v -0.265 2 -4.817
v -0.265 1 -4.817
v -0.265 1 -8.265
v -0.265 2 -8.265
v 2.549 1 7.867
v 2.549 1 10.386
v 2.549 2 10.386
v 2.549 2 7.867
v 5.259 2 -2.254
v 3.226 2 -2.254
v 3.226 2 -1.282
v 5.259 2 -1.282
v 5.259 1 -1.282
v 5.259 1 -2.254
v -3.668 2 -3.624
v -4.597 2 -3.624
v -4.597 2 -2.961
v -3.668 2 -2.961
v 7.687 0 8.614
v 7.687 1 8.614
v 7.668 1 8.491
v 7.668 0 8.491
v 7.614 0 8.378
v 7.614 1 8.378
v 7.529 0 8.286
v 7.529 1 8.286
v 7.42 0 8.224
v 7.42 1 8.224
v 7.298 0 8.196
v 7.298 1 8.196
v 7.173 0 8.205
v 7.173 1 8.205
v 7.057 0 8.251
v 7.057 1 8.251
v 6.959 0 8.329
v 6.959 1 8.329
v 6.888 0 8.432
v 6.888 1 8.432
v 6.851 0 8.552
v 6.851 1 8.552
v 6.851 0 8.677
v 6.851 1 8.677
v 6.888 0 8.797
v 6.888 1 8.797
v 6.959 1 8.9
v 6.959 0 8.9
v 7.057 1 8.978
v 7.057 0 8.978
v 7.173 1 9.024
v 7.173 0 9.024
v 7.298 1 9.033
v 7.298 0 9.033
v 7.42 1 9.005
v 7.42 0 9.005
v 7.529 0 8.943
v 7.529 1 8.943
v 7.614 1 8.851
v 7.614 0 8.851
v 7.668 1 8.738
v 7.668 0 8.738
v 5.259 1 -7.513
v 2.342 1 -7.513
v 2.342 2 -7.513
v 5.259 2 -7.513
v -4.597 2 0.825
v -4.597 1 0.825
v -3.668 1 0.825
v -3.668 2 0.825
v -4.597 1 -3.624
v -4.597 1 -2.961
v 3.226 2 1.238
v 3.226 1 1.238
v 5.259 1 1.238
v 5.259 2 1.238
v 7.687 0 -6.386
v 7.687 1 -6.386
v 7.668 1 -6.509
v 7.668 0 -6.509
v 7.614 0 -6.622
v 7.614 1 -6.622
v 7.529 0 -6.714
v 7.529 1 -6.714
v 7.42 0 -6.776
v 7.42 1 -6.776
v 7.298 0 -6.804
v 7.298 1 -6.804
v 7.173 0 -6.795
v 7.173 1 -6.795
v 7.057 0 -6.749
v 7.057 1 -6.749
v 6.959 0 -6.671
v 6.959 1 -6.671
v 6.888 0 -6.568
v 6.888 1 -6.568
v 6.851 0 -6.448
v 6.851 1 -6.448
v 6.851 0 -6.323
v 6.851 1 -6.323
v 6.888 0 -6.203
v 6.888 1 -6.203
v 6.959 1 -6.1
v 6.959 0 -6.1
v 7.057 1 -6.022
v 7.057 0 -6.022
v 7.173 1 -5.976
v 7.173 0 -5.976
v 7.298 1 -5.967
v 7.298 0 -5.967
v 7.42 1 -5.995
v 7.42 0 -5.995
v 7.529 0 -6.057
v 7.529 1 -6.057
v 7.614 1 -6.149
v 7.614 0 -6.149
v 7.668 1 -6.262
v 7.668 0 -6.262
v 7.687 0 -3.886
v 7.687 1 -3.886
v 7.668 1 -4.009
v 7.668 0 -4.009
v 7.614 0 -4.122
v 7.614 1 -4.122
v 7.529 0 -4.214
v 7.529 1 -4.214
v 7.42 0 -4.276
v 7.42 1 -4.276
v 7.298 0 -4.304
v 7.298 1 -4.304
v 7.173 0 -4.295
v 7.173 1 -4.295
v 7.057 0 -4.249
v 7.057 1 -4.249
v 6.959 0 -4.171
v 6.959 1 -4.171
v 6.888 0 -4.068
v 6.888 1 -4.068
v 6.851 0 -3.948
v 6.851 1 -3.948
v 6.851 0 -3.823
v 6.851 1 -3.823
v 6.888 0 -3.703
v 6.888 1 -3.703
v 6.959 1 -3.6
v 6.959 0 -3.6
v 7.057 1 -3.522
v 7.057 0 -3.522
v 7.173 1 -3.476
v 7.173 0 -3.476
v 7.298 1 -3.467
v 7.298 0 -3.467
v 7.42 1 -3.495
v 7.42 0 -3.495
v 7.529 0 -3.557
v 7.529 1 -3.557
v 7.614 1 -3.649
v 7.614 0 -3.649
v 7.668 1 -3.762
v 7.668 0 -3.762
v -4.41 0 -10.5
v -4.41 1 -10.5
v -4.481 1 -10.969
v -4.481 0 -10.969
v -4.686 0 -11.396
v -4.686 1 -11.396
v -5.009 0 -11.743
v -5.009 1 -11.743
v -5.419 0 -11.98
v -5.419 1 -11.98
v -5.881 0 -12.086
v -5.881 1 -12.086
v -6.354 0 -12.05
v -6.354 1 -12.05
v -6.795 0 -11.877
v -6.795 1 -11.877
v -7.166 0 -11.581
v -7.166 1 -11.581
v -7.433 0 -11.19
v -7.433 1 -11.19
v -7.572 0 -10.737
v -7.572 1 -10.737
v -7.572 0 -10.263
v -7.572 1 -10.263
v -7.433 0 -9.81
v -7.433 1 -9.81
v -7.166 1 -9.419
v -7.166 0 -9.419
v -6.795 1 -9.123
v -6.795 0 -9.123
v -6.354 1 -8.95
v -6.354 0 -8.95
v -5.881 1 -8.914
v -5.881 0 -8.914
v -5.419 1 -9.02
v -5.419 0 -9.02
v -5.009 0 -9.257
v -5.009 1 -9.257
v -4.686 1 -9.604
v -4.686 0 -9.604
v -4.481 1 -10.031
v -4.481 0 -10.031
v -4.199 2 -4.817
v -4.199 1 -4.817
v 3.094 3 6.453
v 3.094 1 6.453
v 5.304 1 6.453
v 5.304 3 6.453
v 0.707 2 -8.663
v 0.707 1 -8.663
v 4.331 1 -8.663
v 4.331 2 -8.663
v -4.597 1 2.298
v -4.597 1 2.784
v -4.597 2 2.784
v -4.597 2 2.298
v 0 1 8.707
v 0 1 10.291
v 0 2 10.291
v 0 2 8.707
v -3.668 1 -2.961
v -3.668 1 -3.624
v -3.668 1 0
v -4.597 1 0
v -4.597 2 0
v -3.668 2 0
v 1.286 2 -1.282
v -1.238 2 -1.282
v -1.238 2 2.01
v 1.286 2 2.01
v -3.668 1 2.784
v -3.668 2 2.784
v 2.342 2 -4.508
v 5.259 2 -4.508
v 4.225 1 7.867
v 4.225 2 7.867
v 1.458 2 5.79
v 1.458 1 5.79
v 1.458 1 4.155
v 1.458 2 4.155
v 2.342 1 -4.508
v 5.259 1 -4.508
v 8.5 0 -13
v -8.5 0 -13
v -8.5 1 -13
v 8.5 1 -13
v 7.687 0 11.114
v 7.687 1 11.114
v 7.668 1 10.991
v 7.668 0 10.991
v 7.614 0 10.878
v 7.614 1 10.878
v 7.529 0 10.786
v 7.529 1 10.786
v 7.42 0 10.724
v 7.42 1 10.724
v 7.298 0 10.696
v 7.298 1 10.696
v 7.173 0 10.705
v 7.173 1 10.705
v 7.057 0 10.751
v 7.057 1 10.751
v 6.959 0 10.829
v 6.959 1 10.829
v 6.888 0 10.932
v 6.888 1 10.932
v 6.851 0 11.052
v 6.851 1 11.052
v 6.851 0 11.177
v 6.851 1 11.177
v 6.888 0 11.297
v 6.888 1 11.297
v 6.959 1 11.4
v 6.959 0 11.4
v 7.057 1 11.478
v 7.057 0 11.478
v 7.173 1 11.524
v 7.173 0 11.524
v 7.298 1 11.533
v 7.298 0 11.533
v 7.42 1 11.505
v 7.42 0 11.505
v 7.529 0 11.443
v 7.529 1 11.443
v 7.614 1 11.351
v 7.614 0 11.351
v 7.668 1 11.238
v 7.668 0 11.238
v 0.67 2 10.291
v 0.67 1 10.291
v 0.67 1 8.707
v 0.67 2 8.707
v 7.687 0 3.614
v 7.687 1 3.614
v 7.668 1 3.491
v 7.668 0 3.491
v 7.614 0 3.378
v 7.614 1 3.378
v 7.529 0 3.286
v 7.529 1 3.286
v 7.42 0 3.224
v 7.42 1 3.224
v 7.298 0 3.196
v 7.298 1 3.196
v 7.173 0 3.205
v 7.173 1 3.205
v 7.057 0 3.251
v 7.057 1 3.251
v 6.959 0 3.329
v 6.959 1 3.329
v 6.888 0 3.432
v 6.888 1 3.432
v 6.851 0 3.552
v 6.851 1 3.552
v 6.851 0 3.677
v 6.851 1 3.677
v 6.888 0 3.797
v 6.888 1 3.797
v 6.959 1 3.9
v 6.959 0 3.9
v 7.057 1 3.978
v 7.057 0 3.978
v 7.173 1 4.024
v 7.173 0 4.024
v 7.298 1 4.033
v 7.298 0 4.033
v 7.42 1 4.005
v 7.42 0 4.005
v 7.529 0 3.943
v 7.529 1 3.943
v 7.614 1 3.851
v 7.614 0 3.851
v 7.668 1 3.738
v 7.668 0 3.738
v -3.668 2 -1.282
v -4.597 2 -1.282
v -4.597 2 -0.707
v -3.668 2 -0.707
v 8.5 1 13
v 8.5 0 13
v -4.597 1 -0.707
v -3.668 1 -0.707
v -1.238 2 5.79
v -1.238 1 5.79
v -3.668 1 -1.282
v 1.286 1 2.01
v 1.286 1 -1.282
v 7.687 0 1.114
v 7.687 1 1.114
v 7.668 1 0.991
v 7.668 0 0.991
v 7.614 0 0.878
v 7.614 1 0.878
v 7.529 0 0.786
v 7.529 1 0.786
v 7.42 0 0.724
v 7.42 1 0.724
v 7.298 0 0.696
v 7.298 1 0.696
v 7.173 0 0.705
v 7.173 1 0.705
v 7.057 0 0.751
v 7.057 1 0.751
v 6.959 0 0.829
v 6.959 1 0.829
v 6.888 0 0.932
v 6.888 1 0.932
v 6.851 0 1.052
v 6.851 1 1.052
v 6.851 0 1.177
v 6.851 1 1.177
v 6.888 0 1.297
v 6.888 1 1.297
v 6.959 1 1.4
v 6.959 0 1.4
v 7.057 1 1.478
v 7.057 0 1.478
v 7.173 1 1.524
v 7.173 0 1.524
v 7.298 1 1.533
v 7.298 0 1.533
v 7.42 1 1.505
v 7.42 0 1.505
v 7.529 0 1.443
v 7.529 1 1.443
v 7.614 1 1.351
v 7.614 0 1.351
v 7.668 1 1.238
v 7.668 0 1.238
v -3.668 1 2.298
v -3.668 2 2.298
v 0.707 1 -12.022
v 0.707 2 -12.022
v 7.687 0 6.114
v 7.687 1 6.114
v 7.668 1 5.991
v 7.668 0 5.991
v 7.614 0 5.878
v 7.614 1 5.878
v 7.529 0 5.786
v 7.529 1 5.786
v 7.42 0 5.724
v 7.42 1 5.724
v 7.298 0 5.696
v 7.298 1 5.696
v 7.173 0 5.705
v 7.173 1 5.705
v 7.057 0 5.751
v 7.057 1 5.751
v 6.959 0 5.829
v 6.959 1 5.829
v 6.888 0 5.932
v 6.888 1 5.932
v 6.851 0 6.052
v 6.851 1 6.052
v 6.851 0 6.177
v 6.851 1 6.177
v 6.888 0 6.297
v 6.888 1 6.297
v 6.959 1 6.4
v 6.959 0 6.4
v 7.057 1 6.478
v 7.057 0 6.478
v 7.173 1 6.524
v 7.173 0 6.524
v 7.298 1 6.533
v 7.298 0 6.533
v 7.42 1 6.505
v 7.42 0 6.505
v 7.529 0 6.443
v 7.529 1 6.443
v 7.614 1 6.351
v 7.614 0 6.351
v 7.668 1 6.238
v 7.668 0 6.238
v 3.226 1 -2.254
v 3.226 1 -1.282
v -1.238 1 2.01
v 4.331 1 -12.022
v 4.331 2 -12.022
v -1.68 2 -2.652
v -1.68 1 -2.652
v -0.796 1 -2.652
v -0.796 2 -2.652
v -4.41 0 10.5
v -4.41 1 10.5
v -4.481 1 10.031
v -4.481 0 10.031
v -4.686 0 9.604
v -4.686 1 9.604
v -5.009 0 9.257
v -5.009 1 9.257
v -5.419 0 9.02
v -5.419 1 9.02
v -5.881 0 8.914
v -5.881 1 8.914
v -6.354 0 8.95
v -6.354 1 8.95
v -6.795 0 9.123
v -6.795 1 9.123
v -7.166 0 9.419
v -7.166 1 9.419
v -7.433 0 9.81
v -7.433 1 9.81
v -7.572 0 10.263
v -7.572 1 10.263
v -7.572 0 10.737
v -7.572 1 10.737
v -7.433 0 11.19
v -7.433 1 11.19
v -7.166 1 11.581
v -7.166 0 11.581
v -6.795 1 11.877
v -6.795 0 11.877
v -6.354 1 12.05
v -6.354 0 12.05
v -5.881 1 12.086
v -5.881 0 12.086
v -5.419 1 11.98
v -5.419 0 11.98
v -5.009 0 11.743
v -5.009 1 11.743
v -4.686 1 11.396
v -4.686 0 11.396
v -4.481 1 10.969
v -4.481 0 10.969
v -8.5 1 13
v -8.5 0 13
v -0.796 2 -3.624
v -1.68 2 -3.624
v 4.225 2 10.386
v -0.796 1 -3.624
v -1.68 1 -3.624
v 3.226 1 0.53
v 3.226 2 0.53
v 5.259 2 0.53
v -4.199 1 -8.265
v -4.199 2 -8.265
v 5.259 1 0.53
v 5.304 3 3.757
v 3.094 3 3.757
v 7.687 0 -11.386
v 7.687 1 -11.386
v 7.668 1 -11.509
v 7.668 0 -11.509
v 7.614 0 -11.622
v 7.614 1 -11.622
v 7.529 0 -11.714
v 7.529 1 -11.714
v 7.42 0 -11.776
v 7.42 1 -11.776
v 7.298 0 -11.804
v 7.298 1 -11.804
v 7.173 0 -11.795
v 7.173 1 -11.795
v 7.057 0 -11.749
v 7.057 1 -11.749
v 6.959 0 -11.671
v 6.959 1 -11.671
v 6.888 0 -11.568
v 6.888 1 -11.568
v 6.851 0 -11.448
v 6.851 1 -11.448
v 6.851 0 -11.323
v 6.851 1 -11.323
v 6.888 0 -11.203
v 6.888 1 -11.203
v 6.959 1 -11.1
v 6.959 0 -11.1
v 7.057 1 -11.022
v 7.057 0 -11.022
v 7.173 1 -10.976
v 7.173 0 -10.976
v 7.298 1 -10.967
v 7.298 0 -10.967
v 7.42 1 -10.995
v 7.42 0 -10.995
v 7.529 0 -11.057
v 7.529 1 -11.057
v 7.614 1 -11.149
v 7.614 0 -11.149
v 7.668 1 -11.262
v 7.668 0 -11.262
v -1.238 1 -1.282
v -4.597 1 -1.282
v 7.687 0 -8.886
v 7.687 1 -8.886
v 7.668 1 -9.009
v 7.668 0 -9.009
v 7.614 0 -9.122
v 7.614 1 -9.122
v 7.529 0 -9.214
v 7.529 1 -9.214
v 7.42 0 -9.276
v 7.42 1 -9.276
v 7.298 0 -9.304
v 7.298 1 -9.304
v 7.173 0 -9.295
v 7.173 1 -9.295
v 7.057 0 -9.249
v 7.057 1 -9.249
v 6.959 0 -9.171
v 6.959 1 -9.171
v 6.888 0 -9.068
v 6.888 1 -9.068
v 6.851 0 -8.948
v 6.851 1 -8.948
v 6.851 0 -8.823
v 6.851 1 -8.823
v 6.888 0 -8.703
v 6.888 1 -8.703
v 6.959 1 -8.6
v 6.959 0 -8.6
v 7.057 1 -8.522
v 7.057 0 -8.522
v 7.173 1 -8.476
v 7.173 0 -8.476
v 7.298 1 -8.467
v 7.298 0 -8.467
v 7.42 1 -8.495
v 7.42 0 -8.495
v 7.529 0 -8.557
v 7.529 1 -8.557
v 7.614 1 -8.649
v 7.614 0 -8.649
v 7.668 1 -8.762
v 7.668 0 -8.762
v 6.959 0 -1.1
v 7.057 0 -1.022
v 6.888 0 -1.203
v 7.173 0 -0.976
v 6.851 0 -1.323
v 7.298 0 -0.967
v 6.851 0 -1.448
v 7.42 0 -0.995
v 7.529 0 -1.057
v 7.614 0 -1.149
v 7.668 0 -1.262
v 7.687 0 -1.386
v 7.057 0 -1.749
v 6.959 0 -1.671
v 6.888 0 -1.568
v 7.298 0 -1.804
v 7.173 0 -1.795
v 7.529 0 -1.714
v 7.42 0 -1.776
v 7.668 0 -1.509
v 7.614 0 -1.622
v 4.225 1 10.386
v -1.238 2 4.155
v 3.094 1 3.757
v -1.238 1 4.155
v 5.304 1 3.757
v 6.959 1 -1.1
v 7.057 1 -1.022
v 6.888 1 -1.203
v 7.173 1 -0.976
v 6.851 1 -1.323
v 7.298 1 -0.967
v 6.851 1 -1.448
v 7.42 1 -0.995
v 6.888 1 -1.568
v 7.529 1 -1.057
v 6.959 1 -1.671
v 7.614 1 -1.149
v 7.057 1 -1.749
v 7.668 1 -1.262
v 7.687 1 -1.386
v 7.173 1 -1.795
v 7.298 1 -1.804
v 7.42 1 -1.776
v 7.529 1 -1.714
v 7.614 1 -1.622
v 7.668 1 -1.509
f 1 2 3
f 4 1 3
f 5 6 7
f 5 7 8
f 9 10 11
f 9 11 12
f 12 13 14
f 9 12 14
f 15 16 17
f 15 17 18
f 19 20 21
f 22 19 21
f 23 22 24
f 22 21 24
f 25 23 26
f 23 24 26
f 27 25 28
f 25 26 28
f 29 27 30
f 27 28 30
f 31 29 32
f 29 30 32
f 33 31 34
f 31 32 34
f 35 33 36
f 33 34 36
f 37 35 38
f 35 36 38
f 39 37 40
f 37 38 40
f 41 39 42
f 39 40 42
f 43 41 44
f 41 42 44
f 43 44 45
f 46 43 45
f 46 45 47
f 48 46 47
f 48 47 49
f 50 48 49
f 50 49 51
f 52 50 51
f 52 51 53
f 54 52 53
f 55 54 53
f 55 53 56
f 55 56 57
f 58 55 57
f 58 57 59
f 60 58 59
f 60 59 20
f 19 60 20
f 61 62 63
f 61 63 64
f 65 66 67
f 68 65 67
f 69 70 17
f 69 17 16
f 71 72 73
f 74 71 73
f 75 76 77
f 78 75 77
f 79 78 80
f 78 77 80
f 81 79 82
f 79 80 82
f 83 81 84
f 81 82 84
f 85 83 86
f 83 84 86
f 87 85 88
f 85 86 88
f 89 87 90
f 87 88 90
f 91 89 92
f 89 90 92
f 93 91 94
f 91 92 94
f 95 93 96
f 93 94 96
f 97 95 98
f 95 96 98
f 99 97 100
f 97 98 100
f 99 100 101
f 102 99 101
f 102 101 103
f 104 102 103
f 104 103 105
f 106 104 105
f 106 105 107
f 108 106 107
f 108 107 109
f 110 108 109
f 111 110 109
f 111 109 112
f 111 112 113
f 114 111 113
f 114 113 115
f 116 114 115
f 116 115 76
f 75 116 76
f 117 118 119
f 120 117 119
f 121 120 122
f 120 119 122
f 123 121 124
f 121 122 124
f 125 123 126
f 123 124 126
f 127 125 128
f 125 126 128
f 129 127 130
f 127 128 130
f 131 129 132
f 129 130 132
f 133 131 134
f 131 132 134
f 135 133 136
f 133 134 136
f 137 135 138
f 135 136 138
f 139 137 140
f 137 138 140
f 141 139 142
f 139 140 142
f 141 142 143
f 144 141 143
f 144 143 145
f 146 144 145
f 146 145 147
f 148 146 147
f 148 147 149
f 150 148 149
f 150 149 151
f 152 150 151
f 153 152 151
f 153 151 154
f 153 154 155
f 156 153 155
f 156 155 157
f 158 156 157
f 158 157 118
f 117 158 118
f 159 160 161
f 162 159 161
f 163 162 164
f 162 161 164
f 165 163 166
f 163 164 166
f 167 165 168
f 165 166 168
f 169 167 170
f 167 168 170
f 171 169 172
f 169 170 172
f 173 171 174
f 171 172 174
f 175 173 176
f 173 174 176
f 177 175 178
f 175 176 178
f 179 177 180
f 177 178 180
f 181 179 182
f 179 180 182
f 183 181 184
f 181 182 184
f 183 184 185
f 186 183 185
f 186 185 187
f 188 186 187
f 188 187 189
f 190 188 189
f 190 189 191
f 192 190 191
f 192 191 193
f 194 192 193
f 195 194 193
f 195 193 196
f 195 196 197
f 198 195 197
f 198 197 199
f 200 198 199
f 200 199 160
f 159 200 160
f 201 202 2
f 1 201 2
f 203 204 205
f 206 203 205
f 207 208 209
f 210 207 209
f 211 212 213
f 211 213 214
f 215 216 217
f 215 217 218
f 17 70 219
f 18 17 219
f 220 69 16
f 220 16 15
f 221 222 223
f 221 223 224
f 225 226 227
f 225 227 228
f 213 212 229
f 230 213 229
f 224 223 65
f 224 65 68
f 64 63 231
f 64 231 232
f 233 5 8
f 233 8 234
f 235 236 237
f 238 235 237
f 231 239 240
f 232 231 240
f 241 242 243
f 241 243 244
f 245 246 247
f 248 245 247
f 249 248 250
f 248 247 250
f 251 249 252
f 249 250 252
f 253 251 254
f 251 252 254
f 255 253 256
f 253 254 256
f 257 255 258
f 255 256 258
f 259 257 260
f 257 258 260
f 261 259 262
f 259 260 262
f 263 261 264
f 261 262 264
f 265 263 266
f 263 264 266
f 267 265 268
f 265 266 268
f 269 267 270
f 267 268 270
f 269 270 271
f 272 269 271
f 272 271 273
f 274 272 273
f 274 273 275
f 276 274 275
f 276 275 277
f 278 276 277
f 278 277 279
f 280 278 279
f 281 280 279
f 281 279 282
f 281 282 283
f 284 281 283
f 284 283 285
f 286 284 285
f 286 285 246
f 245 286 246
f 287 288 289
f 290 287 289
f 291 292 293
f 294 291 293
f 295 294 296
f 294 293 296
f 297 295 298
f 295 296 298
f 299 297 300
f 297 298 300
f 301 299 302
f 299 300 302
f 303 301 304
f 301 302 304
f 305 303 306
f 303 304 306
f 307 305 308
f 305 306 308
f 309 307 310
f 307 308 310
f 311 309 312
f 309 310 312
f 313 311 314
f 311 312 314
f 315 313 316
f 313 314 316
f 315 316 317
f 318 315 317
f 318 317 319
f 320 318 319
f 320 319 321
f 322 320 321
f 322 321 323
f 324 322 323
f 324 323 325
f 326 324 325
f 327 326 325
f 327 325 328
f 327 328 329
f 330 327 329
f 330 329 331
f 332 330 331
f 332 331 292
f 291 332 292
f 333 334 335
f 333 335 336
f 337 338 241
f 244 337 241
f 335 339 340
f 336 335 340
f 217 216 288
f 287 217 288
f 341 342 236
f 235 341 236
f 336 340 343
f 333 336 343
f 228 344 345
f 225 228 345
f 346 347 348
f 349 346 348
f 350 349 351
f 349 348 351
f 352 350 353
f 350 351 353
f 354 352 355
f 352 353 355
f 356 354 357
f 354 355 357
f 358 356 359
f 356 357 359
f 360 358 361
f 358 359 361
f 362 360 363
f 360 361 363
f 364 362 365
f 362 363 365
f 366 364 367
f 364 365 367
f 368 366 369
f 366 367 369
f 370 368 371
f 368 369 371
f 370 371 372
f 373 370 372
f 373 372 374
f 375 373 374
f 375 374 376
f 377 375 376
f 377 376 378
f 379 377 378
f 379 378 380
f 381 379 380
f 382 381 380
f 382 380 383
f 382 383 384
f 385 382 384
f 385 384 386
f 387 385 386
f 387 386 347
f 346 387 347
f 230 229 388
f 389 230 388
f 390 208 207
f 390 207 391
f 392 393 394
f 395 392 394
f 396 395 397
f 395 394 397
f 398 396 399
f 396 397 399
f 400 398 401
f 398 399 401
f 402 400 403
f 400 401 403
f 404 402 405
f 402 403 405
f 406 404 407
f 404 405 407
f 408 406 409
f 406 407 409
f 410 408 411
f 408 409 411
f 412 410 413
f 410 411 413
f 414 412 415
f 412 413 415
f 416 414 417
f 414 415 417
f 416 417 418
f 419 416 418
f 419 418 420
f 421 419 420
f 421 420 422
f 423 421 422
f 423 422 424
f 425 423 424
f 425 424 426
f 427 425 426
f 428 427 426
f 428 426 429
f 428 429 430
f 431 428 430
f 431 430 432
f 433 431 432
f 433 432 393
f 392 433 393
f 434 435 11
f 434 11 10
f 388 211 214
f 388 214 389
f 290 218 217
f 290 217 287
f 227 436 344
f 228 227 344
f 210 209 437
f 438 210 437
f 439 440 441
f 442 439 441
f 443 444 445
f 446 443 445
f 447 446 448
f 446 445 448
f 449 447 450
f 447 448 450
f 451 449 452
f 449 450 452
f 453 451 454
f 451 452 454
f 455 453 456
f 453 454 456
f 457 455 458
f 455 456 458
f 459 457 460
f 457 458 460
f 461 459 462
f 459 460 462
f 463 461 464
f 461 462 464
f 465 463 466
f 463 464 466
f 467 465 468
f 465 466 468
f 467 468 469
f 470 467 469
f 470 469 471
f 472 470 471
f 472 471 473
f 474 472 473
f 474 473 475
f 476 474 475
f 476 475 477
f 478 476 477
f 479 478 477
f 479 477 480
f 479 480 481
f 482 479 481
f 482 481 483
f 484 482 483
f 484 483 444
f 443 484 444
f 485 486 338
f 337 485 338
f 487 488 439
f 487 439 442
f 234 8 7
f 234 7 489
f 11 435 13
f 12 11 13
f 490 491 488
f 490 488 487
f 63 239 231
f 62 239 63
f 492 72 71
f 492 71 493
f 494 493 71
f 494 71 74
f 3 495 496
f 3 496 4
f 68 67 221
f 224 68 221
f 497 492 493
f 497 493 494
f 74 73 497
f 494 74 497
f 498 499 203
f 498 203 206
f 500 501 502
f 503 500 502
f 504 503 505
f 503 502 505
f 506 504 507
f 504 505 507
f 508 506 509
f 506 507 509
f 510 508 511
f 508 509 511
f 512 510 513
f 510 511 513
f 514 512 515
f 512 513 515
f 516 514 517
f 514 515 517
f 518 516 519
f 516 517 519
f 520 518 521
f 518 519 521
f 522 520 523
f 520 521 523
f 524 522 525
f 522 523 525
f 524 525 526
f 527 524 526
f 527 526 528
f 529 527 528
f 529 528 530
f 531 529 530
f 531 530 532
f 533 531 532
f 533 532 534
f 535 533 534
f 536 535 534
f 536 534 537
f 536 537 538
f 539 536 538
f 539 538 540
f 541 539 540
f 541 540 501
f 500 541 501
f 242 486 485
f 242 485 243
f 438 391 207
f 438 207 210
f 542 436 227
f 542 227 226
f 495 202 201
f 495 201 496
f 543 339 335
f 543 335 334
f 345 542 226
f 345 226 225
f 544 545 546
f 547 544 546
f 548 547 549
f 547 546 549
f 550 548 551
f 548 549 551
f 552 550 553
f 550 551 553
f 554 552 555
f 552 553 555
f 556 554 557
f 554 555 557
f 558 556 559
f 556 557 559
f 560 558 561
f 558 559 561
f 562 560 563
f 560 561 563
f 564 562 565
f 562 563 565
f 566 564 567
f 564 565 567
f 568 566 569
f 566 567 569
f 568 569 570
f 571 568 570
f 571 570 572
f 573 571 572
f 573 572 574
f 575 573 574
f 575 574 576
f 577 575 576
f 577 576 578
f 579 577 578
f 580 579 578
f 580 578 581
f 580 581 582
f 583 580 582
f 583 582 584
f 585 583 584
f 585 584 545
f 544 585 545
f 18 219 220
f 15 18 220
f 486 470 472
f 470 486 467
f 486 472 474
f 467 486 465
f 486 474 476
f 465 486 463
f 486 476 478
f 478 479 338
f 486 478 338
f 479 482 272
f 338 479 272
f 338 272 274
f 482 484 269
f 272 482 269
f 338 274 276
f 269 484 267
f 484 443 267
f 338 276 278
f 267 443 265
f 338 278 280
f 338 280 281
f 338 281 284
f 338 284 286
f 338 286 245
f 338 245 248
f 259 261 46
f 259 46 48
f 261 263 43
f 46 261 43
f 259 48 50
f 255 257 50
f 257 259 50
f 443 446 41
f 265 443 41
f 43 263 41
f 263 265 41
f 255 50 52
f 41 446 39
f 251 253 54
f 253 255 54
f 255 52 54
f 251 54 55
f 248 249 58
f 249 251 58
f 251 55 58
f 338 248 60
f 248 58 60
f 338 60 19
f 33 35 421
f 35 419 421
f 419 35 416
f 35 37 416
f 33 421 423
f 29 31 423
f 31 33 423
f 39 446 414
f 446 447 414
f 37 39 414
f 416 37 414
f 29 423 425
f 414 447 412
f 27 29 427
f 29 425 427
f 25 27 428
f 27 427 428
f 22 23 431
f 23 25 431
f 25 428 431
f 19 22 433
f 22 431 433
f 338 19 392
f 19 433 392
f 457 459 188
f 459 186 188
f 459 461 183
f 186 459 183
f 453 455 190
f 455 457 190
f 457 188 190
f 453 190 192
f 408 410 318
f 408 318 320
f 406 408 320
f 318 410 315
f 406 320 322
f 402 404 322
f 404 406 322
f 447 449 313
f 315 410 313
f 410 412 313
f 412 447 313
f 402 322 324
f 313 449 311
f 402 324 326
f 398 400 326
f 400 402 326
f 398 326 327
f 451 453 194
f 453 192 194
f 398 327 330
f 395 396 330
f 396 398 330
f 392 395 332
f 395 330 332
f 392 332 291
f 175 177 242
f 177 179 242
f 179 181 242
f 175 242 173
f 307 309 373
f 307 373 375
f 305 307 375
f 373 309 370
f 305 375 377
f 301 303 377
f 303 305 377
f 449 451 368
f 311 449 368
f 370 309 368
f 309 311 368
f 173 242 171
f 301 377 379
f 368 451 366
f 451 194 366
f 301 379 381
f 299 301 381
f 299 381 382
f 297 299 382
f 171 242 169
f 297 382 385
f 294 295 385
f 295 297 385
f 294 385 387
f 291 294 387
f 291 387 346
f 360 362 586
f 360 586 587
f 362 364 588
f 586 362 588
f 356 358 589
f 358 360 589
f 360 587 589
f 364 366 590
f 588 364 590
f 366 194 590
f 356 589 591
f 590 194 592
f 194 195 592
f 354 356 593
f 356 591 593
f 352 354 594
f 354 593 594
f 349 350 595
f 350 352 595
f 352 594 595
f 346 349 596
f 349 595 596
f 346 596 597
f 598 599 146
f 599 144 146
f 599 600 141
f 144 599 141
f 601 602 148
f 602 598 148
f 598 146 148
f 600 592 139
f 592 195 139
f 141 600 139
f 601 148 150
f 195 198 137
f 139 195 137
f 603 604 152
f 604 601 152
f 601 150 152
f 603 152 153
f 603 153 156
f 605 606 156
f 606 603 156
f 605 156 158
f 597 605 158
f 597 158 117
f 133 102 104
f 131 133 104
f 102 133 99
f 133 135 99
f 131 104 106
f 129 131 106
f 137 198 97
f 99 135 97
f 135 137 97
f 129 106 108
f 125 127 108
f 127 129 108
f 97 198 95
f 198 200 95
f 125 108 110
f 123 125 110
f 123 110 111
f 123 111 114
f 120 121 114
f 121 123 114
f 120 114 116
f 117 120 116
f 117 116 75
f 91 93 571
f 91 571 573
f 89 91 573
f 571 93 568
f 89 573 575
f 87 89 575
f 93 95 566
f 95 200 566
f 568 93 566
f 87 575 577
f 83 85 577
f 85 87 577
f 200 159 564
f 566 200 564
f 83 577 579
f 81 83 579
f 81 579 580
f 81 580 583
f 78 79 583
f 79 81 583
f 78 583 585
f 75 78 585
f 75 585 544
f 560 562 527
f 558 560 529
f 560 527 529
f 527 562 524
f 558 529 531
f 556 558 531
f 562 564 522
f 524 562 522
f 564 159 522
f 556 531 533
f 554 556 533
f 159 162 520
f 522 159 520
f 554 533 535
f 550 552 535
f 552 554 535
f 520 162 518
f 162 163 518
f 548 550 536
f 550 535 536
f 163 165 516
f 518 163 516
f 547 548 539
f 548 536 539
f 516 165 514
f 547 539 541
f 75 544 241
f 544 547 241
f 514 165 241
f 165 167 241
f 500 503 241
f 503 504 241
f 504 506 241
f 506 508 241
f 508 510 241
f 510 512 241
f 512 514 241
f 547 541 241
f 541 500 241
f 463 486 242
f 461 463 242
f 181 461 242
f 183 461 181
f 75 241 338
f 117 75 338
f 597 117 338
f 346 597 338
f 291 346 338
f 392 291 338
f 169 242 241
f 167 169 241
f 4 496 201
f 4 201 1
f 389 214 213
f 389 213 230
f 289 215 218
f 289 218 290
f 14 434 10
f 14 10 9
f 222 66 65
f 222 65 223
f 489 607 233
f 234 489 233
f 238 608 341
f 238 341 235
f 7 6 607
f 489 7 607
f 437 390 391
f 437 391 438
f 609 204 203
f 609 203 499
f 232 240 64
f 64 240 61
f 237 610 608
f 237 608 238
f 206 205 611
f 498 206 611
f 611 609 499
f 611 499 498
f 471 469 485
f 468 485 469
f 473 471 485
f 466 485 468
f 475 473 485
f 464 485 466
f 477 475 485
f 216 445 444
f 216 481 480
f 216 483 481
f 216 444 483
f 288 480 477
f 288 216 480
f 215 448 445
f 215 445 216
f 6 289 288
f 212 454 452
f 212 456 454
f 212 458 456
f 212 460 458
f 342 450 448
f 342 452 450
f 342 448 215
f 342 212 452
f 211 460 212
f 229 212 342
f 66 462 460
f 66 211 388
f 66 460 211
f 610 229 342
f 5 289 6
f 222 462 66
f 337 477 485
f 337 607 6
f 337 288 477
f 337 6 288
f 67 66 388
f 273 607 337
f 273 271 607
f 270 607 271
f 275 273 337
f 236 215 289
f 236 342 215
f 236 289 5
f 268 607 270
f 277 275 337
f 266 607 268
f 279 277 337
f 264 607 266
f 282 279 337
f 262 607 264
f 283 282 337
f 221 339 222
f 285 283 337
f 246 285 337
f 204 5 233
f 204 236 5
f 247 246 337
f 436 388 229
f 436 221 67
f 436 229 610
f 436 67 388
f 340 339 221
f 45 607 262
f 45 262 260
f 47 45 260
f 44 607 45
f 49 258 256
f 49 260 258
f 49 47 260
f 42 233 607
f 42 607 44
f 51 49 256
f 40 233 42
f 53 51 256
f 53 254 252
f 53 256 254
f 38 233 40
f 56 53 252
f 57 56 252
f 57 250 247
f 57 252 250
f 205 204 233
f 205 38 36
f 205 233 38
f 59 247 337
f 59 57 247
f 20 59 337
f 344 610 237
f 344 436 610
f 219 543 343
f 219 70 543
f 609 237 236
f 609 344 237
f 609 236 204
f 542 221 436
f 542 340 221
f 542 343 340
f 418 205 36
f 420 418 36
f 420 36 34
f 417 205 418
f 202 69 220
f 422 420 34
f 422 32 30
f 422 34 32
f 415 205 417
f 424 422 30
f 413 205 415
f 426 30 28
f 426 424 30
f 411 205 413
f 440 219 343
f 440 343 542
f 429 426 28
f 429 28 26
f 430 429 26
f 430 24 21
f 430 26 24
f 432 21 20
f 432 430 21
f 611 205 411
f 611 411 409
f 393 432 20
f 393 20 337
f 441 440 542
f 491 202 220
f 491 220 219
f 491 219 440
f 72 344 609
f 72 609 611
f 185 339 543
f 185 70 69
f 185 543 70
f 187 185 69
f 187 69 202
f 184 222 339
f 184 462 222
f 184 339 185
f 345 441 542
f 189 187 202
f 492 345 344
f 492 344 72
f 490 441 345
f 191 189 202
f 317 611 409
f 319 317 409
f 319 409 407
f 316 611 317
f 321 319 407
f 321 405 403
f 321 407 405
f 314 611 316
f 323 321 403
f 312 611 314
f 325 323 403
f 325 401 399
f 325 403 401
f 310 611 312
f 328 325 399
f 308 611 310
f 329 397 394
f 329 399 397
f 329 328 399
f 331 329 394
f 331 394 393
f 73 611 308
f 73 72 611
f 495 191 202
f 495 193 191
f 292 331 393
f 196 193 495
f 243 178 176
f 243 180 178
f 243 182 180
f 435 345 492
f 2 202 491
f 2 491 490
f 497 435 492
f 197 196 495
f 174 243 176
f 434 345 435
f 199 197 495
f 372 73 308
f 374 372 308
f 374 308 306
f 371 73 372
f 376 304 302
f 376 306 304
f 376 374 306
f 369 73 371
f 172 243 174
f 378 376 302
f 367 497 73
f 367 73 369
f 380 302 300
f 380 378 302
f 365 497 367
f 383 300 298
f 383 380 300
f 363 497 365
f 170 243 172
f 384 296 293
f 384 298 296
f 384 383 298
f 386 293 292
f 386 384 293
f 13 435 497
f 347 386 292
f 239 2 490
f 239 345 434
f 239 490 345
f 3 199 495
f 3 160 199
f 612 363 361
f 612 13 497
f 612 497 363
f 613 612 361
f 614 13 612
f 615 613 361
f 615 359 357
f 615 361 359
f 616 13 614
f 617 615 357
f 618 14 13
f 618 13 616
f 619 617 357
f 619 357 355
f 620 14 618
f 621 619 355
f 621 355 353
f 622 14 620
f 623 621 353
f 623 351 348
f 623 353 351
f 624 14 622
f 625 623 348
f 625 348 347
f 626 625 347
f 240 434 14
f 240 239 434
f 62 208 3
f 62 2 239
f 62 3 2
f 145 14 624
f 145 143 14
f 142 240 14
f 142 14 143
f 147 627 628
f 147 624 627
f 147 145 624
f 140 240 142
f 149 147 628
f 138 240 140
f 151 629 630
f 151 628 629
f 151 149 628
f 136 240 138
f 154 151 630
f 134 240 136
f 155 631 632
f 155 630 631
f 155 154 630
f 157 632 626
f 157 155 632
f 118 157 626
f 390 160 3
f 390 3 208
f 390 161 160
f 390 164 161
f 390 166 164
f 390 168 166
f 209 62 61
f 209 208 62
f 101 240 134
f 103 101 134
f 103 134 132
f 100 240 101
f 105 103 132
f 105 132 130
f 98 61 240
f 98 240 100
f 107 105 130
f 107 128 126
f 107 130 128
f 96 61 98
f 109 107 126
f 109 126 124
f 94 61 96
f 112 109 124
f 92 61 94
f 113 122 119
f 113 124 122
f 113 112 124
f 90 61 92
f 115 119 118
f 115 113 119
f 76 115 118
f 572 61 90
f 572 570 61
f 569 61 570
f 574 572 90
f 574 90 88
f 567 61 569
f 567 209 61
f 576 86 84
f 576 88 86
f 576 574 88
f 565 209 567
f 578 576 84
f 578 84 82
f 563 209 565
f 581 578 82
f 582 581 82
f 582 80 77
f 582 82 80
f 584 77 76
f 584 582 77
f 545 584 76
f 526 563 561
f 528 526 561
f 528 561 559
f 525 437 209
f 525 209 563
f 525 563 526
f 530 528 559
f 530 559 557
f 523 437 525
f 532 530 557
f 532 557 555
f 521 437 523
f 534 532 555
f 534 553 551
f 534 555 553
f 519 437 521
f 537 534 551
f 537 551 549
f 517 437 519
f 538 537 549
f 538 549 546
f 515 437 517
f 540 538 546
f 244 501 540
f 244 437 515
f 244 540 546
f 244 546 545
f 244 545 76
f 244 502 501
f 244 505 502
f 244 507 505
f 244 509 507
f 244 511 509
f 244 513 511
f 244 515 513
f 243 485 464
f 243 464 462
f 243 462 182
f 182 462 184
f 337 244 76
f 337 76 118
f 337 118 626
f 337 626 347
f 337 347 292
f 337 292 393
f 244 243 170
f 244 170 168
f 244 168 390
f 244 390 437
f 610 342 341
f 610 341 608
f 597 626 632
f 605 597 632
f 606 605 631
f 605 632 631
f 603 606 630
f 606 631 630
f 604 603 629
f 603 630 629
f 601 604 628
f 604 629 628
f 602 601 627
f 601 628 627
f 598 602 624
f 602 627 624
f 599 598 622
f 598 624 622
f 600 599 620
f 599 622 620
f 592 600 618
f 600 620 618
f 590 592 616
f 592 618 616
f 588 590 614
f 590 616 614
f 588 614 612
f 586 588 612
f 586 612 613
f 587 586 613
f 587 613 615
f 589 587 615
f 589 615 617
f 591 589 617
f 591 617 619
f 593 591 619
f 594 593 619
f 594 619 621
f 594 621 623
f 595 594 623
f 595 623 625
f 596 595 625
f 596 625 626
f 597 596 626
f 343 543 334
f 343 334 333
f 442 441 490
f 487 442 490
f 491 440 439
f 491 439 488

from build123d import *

# Parameters (mm, degrees)
SKETCH2_W           = 17
SKETCH2_H           = 26
BOSS_EXTRUDE1_DEPTH = 1
SKETCH3_R           = 0.825554505
SKETCH3_R_2         = 0.799067601
SKETCH3_R_3         = 0.4
SKETCH3_R_4         = 0.016836885
SKETCH3_W           = 3.624022482
SKETCH3_H           = 3.358967559
SKETCH3_W_2         = 2.916998144
SKETCH3_H_2         = 3.005392027
SKETCH3_W_3         = 3.9335278
SKETCH3_H_3         = 3.447361443
SKETCH3_W_4         = 0.928135773
SKETCH3_H_4         = 0.662954124
SKETCH3_W_5         = 0.883938831
SKETCH3_H_5         = 0.972332715
SKETCH3_W_6         = 2.524073743
SKETCH3_H_6         = 3.291762325
SKETCH3_H_7         = 0.574560241
SKETCH3_H_8         = 0.82518615
SKETCH3_H_9         = 0.486166357
SKETCH3_W_7         = 2.696013436
SKETCH3_H_10        = 1.635286838
SKETCH3_W_8         = 2.033059313
SKETCH3_H_11        = 0.972332714
SKETCH3_H_12        = 0.707151065
SKETCH3_W_9         = 1.676172691
SKETCH3_H_13        = 2.519225669
SKETCH3_W_10        = 0.670281766
SKETCH3_H_14        = 1.583920148
BOSS_EXTRUDE2_DEPTH = 1
SKETCH4_R           = 1.59
SKETCH4_R_2         = 0.42
CUT_EXTRUDE1_DEPTH  = 3
SKETCH5_W           = 2.209847079
SKETCH5_H           = 2.696013435
BOSS_EXTRUDE3_DEPTH = 2


with BuildPart() as part:
    # Sketch2 → Boss-Extrude1 (new body)
    with BuildSketch(Plane(origin=(0, 0, 0), x_dir=(1, 0, 0), z_dir=(0, 1, 0))):
        Rectangle(SKETCH2_W, SKETCH2_H)
    extrude(amount=BOSS_EXTRUDE1_DEPTH)

    # Sketch3 → Boss-Extrude2 (add)
    with BuildSketch(Plane(origin=(0, 1, 0), x_dir=(1, 0, 0), z_dir=(0, 1, 0))):
        with Locations((-6, -10.5)):
            Circle(SKETCH3_R)
        with Locations((-6, 10.5)):
            Circle(SKETCH3_R_2)
        with Locations((7.26674642, 11.385525432)):
            Circle(SKETCH3_R_3)
        with Locations((7.26674642, 11.385525432)):
            Circle(SKETCH3_R_4, mode=Mode.SUBTRACT)
        with Locations((2.519162306, 10.342084328)):
            Rectangle(SKETCH3_W, SKETCH3_H)
        with Locations((3.800810248, 6.010784054)):
            Rectangle(SKETCH3_W_2, SKETCH3_H_2)
        with Locations((-2.232072277, 6.541147353)):
            Rectangle(SKETCH3_W_3, SKETCH3_H_3)
        with Locations((-4.132540764, 3.292672147)):
            Rectangle(SKETCH3_W_4, SKETCH3_H_4)
        with Locations((-1.237641092, 3.137982852)):
            Rectangle(SKETCH3_W_5, SKETCH3_H_5)
        with Locations((0.024395781, -0.364169856)):
            Rectangle(SKETCH3_W_6, SKETCH3_H_6)
        with Locations((-4.132540764, 0.994431186)):
            Rectangle(SKETCH3_W_4, SKETCH3_H_7)
        with Locations((-4.132540764, -0.412593075)):
            Rectangle(SKETCH3_W_4, SKETCH3_H_8)
        with Locations((-4.132540764, -2.54132414)):
            Rectangle(SKETCH3_W_4, SKETCH3_H_9)
        with Locations((0.110365627, -4.972155927)):
            Rectangle(SKETCH3_W_7, SKETCH3_H_10)
        with Locations((4.242779664, 1.767877663)):
            Rectangle(SKETCH3_W_8, SKETCH3_H_11)
        with Locations((4.242779664, -0.883938832)):
            Rectangle(SKETCH3_W_8, SKETCH3_H_12)
        with Locations((3.386837508, -9.126668435)):
            Rectangle(SKETCH3_W_9, SKETCH3_H_13)
        with Locations((0.335140883, -9.498757564)):
            Rectangle(SKETCH3_W_10, SKETCH3_H_14)
    extrude(amount=BOSS_EXTRUDE2_DEPTH)

    # Sketch4 → Cut-Extrude1 (cut, through all)
    with BuildSketch(Plane(origin=(0, 2, 0), x_dir=(1, 0, 0), z_dir=(0, 1, 0))):
        with Locations((-6, 10.5)):
            Circle(SKETCH4_R)
        with Locations((-6, -10.5)):
            Circle(SKETCH4_R)
        with Locations((7.26674642, 11.385525432)):
            Circle(SKETCH4_R_2)
        with Locations((7.26674642, 8.885525432)):
            Circle(SKETCH4_R_2)
        with Locations((7.26674642, 6.385525432)):
            Circle(SKETCH4_R_2)
        with Locations((7.26674642, 3.885525432)):
            Circle(SKETCH4_R_2)
        with Locations((7.26674642, 1.385525432)):
            Circle(SKETCH4_R_2)
        with Locations((7.26674642, -1.114474568)):
            Circle(SKETCH4_R_2)
        with Locations((7.26674642, -3.614474568)):
            Circle(SKETCH4_R_2)
        with Locations((7.26674642, -6.114474568)):
            Circle(SKETCH4_R_2)
        with Locations((7.26674642, -8.614474568)):
            Circle(SKETCH4_R_2)
        with Locations((7.26674642, -11.114474568)):
            Circle(SKETCH4_R_2)
    extrude(amount=-CUT_EXTRUDE1_DEPTH, mode=Mode.SUBTRACT)

    # Sketch5 → Boss-Extrude3 (add)
    with BuildSketch(Plane(origin=(0, 1, 0), x_dir=(1, 0, 0), z_dir=(0, 1, 0))):
        with Locations((4.19870945, -5.104746752)):
            Rectangle(SKETCH5_W, SKETCH5_H)
    extrude(amount=BOSS_EXTRUDE3_DEPTH)


solid = part.part
